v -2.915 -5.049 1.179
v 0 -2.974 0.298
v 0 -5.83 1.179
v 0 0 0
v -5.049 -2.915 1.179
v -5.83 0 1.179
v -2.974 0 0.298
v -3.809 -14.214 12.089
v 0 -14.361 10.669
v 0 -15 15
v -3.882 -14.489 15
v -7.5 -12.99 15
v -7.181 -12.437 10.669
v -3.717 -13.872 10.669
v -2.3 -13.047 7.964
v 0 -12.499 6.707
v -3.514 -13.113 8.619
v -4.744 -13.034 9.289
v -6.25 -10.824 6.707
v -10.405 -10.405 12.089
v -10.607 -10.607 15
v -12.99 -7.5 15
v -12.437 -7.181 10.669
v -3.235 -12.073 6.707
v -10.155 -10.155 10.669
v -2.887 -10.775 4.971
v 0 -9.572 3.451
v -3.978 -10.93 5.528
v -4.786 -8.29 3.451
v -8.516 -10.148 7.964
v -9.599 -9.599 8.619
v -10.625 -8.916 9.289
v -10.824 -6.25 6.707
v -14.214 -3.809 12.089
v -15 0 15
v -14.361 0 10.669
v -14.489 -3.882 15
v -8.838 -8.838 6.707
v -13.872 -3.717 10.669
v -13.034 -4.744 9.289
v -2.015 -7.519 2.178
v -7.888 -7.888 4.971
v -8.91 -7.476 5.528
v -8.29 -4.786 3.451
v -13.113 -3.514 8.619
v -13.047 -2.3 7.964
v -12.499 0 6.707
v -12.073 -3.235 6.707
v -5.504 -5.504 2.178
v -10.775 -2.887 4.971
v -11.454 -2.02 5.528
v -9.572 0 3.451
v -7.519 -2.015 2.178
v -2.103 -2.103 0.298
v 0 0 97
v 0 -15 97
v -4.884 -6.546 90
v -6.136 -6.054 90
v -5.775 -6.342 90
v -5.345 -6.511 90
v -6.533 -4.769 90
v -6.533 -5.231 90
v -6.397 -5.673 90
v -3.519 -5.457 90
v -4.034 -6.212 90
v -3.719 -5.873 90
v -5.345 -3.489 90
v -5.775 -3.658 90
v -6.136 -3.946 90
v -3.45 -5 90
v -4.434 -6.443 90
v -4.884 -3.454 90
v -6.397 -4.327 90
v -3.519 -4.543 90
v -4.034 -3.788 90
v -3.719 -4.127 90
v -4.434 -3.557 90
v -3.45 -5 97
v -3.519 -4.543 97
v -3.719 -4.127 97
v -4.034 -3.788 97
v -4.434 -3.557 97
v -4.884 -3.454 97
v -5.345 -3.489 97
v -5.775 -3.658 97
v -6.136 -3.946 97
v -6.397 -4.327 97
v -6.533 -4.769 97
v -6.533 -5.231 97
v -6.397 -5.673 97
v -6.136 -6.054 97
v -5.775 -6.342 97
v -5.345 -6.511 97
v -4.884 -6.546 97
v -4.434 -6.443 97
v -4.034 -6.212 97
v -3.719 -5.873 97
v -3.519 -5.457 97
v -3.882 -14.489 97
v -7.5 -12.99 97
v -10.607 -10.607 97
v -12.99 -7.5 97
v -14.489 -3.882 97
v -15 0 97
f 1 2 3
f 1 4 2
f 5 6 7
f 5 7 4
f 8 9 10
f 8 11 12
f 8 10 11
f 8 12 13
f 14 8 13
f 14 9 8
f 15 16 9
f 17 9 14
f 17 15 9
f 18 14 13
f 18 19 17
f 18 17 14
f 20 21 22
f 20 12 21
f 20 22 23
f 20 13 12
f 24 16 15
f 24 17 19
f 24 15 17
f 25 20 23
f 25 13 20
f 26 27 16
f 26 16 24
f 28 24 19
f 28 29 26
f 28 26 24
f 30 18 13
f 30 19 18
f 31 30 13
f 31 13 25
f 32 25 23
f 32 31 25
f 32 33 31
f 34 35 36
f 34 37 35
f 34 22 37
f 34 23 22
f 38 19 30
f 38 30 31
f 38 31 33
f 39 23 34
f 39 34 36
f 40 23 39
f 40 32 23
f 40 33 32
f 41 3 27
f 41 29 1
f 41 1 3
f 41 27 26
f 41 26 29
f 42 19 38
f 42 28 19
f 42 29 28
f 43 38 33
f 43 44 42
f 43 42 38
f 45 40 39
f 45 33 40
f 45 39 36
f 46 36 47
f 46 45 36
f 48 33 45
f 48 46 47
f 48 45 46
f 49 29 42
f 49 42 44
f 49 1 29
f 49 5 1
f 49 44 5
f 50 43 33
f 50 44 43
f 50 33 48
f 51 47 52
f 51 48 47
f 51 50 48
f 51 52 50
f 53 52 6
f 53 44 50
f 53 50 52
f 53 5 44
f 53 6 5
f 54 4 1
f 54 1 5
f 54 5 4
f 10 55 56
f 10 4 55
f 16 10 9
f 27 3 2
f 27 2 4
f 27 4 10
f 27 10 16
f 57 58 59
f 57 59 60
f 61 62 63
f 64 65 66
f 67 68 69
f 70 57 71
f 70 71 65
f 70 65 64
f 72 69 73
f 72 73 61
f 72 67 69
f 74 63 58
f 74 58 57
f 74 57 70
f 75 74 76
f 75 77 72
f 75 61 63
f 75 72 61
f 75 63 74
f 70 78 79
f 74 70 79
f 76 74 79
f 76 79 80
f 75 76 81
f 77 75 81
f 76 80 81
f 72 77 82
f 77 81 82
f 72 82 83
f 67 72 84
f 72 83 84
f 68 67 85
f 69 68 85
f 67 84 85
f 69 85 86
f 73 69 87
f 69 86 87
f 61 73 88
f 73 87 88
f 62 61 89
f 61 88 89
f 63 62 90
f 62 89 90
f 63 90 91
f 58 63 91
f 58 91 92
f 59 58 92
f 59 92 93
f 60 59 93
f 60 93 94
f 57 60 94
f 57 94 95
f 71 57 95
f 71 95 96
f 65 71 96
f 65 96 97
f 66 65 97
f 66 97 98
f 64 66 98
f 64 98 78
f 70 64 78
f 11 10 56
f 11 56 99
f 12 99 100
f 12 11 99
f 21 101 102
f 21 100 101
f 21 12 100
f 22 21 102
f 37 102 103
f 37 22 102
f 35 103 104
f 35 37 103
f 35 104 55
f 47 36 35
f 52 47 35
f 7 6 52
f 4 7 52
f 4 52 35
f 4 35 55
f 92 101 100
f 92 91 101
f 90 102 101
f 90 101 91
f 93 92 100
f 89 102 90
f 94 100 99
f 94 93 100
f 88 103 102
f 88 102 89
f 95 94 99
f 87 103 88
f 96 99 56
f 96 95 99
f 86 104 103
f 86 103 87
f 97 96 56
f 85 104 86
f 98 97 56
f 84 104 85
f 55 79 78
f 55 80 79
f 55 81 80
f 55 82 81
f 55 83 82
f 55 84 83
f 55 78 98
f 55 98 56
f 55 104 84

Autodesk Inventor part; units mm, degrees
ref_plane "YZ Plane" through (0, 0, 0) normal (1, 0, 0) x (0, 1, 0)
ref_plane "XZ Plane" through (0, 0, 0) normal (0, 1, 0) x (-1, 0, 0)
ref_plane "XY Plane" through (0, 0, 0) normal (0, 0, 1) x (1, 0, 0)
sketch "Эскиз1" plane through (0, 0, 0) normal (0, 0, 1) x (1, 0, 0)
  arc A0 (-15, 0) -> (0, -15) centre (0, 0) ccw
  line L0 (-15, 0) -> (0, 0)
  line L1 (0, 0) -> (0, -15)
  dimension "d0" = 30
extrude "Выдавливание1" add sketch "Эскиз1" along normal blind 97
fillet "Сопряжение1" radius 15 1 edges at (-10.6066, -10.6066, 0)
sketch "Эскиз2" plane through (0, 0, 97) normal (0, 0, 1) x (1, 0, 0)
  circle A0 centre (-5, -5) radius 1.55
  line L0 (0, 0) -> (-15, 0) projected
  line L1 (0, -15) -> (0, 0) projected
  dimension "d4" = 3.1
  dimension "d5" = 5
  dimension "d6" = 5
extrude "Выдавливание2" cut sketch "Эскиз2" against normal blind 7
properties part number "уголок насу"
